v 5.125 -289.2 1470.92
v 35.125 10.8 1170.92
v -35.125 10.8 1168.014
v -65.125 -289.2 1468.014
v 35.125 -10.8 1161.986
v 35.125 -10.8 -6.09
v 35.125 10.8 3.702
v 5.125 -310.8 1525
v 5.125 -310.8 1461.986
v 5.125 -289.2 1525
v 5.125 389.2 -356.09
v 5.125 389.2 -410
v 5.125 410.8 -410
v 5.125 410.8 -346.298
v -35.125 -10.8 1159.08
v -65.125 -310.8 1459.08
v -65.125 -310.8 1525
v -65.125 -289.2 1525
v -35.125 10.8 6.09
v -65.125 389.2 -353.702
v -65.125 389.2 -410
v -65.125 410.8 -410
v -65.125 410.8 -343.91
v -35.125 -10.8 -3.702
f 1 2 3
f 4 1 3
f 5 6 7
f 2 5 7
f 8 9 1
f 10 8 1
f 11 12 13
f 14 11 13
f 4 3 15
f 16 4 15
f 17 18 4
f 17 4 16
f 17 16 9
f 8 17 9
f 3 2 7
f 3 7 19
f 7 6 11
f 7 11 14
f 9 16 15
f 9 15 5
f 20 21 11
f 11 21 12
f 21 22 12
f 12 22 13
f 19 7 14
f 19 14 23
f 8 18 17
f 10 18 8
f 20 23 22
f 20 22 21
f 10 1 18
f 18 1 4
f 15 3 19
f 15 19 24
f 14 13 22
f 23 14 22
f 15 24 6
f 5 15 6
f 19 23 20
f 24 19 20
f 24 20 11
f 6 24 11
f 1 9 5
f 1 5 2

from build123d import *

# Parameters (mm, degrees)
SKETCH1_W = 70.25
SKETCH1_H = 21.6


with BuildPart() as part:
    # Sweep1: sweep along a curve in space
    with BuildLine() as sweep1_path:
        Line((-30, 400, -350), (-30, 400, -410))
        Line((0, 0, 0), (-30, 400, -350))
        Line((0, 0, 1165), (0, 0, 0))
        Line((-30, -300, 1465), (0, 0, 1165))
        Line((-30, -300, 1465), (-30, -300, 1525))
    # Sketch1 → Sweep1 (sweep)
    with BuildSketch(Plane(origin=(-30, 400, -410), x_dir=(1, 0, 0), z_dir=(0, 0, 1))):
        Rectangle(SKETCH1_W, SKETCH1_H)
    sweep(path=sweep1_path.line, transition=Transition.RIGHT)


solid = part.part
